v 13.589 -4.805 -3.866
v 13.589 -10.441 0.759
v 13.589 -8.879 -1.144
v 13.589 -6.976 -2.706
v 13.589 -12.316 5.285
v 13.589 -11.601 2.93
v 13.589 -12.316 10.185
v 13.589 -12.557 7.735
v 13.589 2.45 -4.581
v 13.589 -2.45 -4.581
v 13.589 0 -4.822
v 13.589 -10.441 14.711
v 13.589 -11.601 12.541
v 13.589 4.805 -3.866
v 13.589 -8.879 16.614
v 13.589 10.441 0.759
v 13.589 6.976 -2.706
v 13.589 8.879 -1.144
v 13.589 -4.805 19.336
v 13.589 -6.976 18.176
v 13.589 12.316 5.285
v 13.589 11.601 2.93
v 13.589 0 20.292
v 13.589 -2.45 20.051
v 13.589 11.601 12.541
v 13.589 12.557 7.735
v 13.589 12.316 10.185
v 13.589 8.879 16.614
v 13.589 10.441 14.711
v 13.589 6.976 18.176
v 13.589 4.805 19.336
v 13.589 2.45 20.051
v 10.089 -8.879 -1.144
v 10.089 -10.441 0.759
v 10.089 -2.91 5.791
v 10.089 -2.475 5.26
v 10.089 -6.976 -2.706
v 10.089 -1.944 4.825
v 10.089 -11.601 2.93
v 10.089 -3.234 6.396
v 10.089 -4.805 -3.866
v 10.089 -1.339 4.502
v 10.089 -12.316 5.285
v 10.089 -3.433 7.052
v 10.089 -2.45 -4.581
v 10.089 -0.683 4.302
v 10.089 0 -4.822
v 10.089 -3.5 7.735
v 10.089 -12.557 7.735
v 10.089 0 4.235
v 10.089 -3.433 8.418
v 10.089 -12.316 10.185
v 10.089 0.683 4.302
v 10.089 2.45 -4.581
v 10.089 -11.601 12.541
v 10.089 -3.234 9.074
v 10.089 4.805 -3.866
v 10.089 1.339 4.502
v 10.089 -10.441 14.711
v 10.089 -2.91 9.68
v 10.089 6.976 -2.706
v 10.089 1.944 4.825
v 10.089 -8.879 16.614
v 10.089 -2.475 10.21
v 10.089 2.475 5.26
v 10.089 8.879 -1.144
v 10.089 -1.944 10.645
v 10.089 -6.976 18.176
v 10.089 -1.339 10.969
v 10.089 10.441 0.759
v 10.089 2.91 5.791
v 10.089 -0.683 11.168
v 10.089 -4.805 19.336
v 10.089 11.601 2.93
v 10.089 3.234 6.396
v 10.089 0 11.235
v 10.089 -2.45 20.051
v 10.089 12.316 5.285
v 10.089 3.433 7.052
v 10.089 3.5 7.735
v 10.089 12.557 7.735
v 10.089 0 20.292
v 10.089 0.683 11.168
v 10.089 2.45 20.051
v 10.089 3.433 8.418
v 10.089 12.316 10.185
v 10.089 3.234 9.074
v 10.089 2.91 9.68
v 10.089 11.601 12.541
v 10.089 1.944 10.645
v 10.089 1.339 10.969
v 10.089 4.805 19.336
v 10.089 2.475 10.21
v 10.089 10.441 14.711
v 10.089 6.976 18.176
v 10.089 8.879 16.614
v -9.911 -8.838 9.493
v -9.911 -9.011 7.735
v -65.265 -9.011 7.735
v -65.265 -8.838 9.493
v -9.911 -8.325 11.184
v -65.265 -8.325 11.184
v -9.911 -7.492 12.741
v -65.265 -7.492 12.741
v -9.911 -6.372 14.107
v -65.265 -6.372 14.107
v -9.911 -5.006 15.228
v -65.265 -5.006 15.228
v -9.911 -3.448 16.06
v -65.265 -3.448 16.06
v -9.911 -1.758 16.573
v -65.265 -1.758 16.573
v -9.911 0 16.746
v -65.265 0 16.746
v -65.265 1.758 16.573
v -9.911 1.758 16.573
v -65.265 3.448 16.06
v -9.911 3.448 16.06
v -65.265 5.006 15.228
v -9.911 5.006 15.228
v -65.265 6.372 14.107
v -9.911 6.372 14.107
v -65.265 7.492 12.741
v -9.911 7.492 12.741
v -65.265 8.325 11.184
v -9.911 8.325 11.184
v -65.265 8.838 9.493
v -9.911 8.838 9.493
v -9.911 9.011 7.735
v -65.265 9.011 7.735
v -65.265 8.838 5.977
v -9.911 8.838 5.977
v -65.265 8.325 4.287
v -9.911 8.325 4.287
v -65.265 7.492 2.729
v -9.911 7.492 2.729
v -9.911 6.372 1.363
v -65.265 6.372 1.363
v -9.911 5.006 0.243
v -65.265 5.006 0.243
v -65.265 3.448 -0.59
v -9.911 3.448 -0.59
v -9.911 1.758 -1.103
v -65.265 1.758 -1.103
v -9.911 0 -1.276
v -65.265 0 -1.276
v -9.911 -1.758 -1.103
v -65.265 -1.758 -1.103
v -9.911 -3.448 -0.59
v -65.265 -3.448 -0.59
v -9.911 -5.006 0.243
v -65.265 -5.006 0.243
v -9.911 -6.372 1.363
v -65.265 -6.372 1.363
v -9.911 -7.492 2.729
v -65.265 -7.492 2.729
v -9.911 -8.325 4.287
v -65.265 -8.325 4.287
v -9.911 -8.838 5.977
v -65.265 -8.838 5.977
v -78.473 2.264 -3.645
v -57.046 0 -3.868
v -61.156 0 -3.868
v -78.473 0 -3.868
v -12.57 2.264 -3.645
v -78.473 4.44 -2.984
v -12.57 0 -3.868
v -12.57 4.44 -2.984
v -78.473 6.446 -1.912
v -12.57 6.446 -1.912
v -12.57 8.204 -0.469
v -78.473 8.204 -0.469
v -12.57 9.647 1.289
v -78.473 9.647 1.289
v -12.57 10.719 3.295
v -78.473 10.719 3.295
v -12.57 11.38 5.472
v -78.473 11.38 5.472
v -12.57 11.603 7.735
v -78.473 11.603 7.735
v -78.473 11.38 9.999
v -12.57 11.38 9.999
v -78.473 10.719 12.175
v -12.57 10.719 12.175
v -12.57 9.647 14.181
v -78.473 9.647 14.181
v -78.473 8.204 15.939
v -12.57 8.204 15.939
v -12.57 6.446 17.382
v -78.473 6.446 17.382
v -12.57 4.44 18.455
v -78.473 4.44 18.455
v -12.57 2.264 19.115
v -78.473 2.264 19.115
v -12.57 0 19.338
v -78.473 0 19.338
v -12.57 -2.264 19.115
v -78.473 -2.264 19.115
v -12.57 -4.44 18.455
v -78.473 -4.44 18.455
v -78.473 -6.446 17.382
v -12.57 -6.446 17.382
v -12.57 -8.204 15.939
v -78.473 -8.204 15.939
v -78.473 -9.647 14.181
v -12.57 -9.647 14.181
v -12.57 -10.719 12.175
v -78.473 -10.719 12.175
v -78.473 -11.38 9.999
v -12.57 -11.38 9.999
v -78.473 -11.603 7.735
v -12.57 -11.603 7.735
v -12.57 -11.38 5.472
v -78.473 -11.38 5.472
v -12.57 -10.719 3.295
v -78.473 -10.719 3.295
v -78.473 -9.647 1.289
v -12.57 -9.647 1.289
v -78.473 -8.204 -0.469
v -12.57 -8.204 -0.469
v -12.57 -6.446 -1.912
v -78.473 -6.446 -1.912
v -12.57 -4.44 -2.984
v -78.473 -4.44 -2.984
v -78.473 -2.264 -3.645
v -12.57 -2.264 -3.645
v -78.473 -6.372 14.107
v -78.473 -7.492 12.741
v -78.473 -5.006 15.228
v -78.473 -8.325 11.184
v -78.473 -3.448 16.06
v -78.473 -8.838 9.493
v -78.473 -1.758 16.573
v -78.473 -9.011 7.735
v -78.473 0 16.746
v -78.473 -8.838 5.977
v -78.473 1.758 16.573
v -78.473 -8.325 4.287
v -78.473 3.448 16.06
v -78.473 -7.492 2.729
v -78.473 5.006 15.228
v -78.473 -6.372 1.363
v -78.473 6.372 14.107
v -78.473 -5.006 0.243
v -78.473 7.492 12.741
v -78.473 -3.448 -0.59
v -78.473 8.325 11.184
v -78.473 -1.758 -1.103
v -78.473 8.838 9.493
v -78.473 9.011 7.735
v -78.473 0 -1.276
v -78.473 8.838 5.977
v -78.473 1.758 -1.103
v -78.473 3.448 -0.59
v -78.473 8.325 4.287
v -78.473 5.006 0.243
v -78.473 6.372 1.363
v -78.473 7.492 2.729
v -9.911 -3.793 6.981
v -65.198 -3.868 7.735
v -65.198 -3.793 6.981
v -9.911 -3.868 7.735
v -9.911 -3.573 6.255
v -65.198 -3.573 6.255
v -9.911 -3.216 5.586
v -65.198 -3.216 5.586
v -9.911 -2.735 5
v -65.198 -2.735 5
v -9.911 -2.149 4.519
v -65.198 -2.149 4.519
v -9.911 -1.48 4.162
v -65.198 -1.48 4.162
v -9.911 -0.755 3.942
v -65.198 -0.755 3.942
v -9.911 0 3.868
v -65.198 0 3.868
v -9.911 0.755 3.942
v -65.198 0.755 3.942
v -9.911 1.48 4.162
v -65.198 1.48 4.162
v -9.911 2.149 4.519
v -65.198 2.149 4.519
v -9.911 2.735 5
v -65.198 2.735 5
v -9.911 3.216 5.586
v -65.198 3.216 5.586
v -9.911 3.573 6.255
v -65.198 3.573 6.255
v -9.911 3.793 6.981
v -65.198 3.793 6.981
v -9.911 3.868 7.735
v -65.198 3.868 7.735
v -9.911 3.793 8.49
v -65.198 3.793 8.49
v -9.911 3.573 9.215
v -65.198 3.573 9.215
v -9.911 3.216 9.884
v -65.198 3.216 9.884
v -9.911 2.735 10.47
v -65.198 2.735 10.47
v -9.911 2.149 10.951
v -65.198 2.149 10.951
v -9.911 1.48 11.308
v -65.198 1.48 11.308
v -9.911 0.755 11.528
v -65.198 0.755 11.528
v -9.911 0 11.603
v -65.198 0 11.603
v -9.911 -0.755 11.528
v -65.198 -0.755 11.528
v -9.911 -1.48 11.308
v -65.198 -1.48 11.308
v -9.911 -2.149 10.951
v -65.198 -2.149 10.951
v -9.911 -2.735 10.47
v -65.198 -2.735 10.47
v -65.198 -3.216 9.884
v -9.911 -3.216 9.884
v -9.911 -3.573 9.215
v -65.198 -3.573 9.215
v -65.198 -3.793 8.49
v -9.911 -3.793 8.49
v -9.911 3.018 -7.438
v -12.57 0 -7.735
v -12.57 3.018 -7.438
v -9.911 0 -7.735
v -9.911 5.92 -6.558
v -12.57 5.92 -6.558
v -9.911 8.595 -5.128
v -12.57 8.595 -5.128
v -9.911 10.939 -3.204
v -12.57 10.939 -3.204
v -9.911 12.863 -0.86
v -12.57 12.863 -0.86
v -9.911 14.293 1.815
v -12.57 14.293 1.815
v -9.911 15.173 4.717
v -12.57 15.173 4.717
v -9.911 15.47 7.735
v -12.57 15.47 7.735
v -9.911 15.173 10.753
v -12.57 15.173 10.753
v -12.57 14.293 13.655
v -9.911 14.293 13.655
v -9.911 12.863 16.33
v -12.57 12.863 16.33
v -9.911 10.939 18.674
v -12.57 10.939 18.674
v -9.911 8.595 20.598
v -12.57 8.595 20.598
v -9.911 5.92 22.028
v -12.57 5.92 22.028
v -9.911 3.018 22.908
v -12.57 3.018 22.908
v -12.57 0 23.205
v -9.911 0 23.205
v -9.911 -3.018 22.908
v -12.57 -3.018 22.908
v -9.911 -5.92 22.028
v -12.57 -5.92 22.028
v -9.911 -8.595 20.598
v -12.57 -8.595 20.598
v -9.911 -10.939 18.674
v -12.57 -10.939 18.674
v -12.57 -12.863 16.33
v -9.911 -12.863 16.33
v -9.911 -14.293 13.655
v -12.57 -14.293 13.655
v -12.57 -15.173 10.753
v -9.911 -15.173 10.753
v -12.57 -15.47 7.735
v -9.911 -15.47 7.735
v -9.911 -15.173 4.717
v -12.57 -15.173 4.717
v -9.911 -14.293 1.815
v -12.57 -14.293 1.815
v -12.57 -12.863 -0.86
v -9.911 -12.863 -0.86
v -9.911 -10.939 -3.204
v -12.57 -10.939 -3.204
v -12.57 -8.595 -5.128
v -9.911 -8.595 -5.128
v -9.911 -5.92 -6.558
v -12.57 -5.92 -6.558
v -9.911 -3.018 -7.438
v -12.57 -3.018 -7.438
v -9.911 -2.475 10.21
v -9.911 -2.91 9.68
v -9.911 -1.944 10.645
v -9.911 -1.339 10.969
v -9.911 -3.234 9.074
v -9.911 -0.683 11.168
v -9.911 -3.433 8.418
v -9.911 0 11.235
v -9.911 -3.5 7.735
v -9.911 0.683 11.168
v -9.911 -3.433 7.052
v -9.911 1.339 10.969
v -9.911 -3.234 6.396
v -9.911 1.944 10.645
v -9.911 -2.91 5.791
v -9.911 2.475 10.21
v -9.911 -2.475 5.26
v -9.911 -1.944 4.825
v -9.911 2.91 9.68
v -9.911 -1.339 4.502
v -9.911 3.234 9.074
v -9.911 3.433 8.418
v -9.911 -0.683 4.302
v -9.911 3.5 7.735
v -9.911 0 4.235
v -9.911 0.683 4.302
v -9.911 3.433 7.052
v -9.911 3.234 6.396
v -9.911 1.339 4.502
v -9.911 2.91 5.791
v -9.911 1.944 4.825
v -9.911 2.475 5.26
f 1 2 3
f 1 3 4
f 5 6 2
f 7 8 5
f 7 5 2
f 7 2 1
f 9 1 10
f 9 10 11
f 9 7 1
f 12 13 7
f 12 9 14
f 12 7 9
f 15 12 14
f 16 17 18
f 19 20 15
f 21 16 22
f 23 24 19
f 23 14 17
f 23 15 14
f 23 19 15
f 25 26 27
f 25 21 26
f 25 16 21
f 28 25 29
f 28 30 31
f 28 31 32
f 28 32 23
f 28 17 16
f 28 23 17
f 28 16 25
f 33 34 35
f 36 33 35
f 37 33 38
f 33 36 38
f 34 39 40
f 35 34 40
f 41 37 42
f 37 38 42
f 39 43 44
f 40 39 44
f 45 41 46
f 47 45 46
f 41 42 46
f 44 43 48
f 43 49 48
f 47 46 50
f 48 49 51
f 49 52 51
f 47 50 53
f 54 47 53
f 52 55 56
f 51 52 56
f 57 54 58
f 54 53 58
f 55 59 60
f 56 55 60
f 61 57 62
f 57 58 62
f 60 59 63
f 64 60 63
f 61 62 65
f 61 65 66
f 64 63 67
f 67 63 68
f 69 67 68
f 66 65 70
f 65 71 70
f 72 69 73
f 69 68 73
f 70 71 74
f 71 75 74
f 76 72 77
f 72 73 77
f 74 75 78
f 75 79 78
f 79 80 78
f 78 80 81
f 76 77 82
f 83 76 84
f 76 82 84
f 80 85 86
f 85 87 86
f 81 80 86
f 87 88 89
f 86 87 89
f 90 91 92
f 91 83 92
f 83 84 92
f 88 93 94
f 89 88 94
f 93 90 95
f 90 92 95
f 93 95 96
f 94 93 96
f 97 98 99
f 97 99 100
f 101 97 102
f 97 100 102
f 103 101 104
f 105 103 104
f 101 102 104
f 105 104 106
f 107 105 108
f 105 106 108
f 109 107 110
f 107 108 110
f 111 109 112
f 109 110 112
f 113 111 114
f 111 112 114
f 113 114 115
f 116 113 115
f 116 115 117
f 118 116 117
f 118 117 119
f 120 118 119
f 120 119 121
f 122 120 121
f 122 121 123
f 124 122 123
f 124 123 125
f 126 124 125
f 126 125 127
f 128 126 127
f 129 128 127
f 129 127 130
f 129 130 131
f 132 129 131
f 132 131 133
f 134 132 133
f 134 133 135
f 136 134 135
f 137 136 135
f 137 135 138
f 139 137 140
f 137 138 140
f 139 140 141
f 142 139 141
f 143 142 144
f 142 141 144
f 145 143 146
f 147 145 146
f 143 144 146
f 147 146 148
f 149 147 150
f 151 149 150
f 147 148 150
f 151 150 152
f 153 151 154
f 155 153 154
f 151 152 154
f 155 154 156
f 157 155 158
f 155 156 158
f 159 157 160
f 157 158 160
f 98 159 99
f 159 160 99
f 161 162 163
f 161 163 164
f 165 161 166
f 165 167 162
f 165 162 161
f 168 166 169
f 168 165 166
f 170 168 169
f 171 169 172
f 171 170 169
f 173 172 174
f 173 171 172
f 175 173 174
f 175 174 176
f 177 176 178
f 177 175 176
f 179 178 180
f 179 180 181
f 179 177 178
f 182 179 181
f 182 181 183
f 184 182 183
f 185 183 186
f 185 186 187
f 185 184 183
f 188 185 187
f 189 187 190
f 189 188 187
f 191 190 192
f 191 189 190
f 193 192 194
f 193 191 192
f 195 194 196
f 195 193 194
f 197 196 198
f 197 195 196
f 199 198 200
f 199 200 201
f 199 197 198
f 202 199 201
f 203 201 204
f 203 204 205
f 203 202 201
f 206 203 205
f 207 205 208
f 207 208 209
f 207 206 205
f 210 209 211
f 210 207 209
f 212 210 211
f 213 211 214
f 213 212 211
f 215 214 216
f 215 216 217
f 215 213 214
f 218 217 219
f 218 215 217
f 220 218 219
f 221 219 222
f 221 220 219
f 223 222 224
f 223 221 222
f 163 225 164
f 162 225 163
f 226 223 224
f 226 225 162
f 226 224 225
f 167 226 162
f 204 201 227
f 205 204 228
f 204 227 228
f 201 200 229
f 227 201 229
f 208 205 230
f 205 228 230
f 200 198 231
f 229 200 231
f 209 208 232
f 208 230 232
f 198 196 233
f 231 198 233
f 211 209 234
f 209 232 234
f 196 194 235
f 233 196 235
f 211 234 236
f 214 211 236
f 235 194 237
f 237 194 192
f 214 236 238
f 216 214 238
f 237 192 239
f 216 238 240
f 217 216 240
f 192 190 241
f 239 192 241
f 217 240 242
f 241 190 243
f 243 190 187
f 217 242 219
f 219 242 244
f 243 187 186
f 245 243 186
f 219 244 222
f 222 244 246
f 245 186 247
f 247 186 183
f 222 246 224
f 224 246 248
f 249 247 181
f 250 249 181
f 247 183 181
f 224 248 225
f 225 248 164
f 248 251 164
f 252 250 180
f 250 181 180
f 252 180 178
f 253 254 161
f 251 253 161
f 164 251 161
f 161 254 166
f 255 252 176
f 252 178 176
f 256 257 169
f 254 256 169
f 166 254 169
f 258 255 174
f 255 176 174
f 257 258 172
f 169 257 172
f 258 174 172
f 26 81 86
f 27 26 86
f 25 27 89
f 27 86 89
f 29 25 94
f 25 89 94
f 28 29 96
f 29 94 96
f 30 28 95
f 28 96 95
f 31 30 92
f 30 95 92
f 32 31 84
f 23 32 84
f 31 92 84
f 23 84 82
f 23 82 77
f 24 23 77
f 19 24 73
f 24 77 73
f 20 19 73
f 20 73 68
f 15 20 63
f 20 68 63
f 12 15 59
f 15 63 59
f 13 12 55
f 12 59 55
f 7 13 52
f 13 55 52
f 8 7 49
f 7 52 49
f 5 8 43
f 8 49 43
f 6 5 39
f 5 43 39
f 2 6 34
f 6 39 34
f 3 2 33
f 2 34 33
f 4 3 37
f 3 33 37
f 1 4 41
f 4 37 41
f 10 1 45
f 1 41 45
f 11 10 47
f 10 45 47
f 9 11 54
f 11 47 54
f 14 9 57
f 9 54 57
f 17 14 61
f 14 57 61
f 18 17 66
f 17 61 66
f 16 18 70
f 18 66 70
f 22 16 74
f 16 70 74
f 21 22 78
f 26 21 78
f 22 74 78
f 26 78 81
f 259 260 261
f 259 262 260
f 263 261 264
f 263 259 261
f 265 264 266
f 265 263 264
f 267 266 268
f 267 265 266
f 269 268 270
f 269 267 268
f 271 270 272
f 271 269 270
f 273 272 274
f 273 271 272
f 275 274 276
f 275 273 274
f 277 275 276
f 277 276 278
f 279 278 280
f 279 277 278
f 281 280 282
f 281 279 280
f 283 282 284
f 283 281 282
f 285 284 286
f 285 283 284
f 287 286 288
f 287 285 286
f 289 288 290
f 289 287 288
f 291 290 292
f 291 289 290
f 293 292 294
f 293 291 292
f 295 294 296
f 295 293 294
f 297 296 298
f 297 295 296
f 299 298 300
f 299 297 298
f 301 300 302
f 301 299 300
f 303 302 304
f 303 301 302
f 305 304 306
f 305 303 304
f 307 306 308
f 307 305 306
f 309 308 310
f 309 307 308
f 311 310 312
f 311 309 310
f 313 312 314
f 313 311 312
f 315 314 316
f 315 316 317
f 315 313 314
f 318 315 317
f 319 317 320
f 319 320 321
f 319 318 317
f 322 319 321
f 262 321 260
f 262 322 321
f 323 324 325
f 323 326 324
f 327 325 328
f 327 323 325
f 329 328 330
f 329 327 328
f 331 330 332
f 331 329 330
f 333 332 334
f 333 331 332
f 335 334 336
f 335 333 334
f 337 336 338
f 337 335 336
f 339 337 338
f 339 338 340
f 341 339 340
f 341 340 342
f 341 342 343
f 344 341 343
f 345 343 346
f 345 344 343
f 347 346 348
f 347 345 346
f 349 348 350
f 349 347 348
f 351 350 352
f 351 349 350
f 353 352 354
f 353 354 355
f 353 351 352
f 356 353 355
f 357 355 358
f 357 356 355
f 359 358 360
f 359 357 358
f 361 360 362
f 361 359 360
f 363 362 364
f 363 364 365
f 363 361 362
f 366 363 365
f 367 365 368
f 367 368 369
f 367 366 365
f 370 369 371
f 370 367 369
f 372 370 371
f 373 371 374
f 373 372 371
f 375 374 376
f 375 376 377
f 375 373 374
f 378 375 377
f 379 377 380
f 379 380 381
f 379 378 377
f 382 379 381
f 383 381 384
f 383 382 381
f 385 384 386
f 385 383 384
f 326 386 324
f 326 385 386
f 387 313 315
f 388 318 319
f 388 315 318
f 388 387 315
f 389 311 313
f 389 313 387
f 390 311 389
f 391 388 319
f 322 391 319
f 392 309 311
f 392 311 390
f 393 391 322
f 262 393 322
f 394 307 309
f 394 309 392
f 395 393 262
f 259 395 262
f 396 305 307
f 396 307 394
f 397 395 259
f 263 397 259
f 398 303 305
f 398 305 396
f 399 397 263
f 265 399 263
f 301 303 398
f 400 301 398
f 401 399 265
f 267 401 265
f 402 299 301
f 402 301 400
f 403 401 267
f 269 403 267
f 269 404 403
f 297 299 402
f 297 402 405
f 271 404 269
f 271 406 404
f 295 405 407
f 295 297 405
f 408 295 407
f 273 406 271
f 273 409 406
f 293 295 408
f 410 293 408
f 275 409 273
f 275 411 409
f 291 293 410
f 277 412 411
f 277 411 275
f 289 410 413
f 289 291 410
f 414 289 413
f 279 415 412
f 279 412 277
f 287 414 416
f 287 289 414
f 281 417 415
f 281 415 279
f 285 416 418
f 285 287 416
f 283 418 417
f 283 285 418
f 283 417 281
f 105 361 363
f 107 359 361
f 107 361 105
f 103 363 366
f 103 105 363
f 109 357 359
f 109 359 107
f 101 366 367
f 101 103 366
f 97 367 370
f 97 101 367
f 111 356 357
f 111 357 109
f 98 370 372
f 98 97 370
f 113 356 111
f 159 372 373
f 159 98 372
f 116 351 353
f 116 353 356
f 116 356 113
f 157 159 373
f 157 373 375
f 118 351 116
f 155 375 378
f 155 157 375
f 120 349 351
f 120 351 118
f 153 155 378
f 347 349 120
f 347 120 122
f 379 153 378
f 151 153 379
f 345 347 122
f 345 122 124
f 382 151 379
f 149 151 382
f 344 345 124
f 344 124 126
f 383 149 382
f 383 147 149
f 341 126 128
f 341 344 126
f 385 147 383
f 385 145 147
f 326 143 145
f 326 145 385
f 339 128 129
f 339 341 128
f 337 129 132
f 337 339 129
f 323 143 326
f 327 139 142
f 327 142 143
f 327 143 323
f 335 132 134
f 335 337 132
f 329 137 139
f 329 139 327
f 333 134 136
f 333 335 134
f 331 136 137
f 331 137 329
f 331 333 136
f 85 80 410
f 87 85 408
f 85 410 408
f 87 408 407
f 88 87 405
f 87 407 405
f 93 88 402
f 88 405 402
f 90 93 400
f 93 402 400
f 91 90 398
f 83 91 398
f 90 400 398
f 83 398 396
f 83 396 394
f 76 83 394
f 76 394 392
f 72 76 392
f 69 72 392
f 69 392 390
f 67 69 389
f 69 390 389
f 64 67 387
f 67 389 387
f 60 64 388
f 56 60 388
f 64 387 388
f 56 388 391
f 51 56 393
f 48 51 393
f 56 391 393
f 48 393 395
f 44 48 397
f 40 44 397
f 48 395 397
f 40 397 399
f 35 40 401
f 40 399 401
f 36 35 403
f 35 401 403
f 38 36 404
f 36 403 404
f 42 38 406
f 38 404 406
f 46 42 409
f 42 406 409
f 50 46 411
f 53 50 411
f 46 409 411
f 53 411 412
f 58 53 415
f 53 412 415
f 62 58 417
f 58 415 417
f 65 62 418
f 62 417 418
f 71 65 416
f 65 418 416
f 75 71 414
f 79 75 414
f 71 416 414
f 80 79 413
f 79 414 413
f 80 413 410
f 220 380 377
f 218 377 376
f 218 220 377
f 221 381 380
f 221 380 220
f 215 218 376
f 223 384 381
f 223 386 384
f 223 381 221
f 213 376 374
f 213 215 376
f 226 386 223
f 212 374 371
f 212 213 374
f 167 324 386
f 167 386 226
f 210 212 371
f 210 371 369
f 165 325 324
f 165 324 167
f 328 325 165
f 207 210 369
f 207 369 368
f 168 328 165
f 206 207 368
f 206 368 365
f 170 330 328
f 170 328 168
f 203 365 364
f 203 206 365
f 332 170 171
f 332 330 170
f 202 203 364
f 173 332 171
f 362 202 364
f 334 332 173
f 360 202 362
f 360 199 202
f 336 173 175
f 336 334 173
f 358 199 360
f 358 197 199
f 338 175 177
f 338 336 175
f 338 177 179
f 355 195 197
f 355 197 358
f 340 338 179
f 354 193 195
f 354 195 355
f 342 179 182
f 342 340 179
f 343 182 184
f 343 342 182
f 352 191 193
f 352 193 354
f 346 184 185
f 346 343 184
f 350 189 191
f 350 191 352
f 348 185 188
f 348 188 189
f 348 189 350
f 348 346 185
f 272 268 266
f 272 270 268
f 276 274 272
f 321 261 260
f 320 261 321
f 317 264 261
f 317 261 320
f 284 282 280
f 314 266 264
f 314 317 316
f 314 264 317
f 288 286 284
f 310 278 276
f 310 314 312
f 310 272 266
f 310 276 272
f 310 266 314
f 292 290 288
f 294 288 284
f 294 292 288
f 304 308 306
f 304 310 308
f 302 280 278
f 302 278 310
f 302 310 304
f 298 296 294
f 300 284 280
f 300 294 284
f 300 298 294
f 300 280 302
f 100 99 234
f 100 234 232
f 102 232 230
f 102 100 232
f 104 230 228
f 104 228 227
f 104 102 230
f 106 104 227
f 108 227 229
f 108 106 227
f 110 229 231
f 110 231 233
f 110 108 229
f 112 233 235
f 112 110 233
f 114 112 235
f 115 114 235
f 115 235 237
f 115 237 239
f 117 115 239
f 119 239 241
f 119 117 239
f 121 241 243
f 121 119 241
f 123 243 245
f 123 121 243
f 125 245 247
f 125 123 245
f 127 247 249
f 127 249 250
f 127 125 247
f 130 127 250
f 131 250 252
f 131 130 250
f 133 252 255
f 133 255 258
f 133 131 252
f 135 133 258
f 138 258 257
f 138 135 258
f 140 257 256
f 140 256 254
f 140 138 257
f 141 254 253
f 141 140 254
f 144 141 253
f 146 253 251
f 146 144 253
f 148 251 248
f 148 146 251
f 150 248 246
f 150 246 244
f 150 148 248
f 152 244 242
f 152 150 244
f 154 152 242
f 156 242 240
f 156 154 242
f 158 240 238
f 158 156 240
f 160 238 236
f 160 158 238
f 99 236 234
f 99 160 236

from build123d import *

# Parameters (mm, degrees)
F0_W     = 44.4768592715
F0_H     = 2.6589424815
F0_W_2   = 4.109274596
F0_H_2   = 7.7351056971
F2_R     = 3.5
F3_DEPTH = 20
F4_R     = 12.5571465135
F4_R_2   = 3.5
F5_DEPTH = 3.5
F6_R     = 9.0110970514
F6_R_2   = 3.8675533142
F7_DEPTH = 61.722
F8_DEPTH = 52.6288
F9_DEPTH = 13.208


with BuildPart() as f1:
    # F0 (on Front) → F1 (revolve)
    with BuildSketch(Plane.XZ):
        with Locations((-34.8079763353, 2.5380816078)):
            Rectangle(F0_W, F0_H)
        Polygon((-12.5695466995, 7.7351061627), (-12.5695466995, 3.8675528485), (-12.5695466995, 1.208610367), (-12.5695466995, -1.208610367), (-12.5695466995, -3.8675528485), (-12.5695466995, -7.7351061627), (-9.9106058478, -7.7351061627), (-9.9106058478, 7.7351061627), align=None)
        Polygon((-57.0464059711, 1.208610367), (-57.0464059711, 3.8675528485), (-61.155680567, 3.8675528485), (-61.155680567, -3.8675528485), (-57.0464059711, -3.8675528485), (-57.0464059711, -1.208610367), align=None)
        with Locations((-63.210317865, 0)):
            Rectangle(F0_W_2, F0_H_2)
        with Locations((-34.8079763353, -2.5380816078)):
            Rectangle(F0_W, F0_H)
    revolve(axis=Axis((-11.2400762737, 0, 7.7351061627), (1, 0, 0)))

    # F2 (on face) → F3 (join)
    with BuildSketch(Plane.YZ.offset(-9.9106058478)):
        with Locations((0, 7.7351061627)):
            Circle(F2_R)
    extrude(amount=F3_DEPTH)

    # F4 (on face) → F5 (join)
    with BuildSketch(Plane.YZ.offset(10.0893941522)):
        with Locations((0, 7.7351061627)):
            Circle(F4_R)
        with Locations((0, 7.7351061627)):
            Circle(F4_R_2, mode=Mode.SUBTRACT)
        with Locations((0, 7.7351061627)):
            Circle(F4_R_2)
    extrude(amount=F5_DEPTH)

    # F6 (on face) → F7 (cut)
    with BuildSketch(Plane(origin=(-65.264955163, 0, 0), x_dir=(0, -1, 0), z_dir=(-1, 0, 0))):
        with Locations((0, 7.7351061627)):
            Circle(F6_R)
        with Locations((0, 7.7351061627)):
            Circle(F6_R_2, mode=Mode.SUBTRACT)
    extrude(amount=-F7_DEPTH, mode=Mode.SUBTRACT)

    # F8 (add): a face of the model
    f8_faces = [f1.faces().sort_by_distance(p)[0] for p in [
        (-12.5695466995, 0, 7.7351061627),
    ]]
    extrude(f8_faces, amount=F8_DEPTH)

    # F9 (add): a face of the model
    f9_faces = [f1.faces().sort_by_distance(p)[0] for p in [
        (-65.264955163, 0, 19.0095924193),
    ]]
    extrude(f9_faces, amount=F9_DEPTH)


solid = f1.part
